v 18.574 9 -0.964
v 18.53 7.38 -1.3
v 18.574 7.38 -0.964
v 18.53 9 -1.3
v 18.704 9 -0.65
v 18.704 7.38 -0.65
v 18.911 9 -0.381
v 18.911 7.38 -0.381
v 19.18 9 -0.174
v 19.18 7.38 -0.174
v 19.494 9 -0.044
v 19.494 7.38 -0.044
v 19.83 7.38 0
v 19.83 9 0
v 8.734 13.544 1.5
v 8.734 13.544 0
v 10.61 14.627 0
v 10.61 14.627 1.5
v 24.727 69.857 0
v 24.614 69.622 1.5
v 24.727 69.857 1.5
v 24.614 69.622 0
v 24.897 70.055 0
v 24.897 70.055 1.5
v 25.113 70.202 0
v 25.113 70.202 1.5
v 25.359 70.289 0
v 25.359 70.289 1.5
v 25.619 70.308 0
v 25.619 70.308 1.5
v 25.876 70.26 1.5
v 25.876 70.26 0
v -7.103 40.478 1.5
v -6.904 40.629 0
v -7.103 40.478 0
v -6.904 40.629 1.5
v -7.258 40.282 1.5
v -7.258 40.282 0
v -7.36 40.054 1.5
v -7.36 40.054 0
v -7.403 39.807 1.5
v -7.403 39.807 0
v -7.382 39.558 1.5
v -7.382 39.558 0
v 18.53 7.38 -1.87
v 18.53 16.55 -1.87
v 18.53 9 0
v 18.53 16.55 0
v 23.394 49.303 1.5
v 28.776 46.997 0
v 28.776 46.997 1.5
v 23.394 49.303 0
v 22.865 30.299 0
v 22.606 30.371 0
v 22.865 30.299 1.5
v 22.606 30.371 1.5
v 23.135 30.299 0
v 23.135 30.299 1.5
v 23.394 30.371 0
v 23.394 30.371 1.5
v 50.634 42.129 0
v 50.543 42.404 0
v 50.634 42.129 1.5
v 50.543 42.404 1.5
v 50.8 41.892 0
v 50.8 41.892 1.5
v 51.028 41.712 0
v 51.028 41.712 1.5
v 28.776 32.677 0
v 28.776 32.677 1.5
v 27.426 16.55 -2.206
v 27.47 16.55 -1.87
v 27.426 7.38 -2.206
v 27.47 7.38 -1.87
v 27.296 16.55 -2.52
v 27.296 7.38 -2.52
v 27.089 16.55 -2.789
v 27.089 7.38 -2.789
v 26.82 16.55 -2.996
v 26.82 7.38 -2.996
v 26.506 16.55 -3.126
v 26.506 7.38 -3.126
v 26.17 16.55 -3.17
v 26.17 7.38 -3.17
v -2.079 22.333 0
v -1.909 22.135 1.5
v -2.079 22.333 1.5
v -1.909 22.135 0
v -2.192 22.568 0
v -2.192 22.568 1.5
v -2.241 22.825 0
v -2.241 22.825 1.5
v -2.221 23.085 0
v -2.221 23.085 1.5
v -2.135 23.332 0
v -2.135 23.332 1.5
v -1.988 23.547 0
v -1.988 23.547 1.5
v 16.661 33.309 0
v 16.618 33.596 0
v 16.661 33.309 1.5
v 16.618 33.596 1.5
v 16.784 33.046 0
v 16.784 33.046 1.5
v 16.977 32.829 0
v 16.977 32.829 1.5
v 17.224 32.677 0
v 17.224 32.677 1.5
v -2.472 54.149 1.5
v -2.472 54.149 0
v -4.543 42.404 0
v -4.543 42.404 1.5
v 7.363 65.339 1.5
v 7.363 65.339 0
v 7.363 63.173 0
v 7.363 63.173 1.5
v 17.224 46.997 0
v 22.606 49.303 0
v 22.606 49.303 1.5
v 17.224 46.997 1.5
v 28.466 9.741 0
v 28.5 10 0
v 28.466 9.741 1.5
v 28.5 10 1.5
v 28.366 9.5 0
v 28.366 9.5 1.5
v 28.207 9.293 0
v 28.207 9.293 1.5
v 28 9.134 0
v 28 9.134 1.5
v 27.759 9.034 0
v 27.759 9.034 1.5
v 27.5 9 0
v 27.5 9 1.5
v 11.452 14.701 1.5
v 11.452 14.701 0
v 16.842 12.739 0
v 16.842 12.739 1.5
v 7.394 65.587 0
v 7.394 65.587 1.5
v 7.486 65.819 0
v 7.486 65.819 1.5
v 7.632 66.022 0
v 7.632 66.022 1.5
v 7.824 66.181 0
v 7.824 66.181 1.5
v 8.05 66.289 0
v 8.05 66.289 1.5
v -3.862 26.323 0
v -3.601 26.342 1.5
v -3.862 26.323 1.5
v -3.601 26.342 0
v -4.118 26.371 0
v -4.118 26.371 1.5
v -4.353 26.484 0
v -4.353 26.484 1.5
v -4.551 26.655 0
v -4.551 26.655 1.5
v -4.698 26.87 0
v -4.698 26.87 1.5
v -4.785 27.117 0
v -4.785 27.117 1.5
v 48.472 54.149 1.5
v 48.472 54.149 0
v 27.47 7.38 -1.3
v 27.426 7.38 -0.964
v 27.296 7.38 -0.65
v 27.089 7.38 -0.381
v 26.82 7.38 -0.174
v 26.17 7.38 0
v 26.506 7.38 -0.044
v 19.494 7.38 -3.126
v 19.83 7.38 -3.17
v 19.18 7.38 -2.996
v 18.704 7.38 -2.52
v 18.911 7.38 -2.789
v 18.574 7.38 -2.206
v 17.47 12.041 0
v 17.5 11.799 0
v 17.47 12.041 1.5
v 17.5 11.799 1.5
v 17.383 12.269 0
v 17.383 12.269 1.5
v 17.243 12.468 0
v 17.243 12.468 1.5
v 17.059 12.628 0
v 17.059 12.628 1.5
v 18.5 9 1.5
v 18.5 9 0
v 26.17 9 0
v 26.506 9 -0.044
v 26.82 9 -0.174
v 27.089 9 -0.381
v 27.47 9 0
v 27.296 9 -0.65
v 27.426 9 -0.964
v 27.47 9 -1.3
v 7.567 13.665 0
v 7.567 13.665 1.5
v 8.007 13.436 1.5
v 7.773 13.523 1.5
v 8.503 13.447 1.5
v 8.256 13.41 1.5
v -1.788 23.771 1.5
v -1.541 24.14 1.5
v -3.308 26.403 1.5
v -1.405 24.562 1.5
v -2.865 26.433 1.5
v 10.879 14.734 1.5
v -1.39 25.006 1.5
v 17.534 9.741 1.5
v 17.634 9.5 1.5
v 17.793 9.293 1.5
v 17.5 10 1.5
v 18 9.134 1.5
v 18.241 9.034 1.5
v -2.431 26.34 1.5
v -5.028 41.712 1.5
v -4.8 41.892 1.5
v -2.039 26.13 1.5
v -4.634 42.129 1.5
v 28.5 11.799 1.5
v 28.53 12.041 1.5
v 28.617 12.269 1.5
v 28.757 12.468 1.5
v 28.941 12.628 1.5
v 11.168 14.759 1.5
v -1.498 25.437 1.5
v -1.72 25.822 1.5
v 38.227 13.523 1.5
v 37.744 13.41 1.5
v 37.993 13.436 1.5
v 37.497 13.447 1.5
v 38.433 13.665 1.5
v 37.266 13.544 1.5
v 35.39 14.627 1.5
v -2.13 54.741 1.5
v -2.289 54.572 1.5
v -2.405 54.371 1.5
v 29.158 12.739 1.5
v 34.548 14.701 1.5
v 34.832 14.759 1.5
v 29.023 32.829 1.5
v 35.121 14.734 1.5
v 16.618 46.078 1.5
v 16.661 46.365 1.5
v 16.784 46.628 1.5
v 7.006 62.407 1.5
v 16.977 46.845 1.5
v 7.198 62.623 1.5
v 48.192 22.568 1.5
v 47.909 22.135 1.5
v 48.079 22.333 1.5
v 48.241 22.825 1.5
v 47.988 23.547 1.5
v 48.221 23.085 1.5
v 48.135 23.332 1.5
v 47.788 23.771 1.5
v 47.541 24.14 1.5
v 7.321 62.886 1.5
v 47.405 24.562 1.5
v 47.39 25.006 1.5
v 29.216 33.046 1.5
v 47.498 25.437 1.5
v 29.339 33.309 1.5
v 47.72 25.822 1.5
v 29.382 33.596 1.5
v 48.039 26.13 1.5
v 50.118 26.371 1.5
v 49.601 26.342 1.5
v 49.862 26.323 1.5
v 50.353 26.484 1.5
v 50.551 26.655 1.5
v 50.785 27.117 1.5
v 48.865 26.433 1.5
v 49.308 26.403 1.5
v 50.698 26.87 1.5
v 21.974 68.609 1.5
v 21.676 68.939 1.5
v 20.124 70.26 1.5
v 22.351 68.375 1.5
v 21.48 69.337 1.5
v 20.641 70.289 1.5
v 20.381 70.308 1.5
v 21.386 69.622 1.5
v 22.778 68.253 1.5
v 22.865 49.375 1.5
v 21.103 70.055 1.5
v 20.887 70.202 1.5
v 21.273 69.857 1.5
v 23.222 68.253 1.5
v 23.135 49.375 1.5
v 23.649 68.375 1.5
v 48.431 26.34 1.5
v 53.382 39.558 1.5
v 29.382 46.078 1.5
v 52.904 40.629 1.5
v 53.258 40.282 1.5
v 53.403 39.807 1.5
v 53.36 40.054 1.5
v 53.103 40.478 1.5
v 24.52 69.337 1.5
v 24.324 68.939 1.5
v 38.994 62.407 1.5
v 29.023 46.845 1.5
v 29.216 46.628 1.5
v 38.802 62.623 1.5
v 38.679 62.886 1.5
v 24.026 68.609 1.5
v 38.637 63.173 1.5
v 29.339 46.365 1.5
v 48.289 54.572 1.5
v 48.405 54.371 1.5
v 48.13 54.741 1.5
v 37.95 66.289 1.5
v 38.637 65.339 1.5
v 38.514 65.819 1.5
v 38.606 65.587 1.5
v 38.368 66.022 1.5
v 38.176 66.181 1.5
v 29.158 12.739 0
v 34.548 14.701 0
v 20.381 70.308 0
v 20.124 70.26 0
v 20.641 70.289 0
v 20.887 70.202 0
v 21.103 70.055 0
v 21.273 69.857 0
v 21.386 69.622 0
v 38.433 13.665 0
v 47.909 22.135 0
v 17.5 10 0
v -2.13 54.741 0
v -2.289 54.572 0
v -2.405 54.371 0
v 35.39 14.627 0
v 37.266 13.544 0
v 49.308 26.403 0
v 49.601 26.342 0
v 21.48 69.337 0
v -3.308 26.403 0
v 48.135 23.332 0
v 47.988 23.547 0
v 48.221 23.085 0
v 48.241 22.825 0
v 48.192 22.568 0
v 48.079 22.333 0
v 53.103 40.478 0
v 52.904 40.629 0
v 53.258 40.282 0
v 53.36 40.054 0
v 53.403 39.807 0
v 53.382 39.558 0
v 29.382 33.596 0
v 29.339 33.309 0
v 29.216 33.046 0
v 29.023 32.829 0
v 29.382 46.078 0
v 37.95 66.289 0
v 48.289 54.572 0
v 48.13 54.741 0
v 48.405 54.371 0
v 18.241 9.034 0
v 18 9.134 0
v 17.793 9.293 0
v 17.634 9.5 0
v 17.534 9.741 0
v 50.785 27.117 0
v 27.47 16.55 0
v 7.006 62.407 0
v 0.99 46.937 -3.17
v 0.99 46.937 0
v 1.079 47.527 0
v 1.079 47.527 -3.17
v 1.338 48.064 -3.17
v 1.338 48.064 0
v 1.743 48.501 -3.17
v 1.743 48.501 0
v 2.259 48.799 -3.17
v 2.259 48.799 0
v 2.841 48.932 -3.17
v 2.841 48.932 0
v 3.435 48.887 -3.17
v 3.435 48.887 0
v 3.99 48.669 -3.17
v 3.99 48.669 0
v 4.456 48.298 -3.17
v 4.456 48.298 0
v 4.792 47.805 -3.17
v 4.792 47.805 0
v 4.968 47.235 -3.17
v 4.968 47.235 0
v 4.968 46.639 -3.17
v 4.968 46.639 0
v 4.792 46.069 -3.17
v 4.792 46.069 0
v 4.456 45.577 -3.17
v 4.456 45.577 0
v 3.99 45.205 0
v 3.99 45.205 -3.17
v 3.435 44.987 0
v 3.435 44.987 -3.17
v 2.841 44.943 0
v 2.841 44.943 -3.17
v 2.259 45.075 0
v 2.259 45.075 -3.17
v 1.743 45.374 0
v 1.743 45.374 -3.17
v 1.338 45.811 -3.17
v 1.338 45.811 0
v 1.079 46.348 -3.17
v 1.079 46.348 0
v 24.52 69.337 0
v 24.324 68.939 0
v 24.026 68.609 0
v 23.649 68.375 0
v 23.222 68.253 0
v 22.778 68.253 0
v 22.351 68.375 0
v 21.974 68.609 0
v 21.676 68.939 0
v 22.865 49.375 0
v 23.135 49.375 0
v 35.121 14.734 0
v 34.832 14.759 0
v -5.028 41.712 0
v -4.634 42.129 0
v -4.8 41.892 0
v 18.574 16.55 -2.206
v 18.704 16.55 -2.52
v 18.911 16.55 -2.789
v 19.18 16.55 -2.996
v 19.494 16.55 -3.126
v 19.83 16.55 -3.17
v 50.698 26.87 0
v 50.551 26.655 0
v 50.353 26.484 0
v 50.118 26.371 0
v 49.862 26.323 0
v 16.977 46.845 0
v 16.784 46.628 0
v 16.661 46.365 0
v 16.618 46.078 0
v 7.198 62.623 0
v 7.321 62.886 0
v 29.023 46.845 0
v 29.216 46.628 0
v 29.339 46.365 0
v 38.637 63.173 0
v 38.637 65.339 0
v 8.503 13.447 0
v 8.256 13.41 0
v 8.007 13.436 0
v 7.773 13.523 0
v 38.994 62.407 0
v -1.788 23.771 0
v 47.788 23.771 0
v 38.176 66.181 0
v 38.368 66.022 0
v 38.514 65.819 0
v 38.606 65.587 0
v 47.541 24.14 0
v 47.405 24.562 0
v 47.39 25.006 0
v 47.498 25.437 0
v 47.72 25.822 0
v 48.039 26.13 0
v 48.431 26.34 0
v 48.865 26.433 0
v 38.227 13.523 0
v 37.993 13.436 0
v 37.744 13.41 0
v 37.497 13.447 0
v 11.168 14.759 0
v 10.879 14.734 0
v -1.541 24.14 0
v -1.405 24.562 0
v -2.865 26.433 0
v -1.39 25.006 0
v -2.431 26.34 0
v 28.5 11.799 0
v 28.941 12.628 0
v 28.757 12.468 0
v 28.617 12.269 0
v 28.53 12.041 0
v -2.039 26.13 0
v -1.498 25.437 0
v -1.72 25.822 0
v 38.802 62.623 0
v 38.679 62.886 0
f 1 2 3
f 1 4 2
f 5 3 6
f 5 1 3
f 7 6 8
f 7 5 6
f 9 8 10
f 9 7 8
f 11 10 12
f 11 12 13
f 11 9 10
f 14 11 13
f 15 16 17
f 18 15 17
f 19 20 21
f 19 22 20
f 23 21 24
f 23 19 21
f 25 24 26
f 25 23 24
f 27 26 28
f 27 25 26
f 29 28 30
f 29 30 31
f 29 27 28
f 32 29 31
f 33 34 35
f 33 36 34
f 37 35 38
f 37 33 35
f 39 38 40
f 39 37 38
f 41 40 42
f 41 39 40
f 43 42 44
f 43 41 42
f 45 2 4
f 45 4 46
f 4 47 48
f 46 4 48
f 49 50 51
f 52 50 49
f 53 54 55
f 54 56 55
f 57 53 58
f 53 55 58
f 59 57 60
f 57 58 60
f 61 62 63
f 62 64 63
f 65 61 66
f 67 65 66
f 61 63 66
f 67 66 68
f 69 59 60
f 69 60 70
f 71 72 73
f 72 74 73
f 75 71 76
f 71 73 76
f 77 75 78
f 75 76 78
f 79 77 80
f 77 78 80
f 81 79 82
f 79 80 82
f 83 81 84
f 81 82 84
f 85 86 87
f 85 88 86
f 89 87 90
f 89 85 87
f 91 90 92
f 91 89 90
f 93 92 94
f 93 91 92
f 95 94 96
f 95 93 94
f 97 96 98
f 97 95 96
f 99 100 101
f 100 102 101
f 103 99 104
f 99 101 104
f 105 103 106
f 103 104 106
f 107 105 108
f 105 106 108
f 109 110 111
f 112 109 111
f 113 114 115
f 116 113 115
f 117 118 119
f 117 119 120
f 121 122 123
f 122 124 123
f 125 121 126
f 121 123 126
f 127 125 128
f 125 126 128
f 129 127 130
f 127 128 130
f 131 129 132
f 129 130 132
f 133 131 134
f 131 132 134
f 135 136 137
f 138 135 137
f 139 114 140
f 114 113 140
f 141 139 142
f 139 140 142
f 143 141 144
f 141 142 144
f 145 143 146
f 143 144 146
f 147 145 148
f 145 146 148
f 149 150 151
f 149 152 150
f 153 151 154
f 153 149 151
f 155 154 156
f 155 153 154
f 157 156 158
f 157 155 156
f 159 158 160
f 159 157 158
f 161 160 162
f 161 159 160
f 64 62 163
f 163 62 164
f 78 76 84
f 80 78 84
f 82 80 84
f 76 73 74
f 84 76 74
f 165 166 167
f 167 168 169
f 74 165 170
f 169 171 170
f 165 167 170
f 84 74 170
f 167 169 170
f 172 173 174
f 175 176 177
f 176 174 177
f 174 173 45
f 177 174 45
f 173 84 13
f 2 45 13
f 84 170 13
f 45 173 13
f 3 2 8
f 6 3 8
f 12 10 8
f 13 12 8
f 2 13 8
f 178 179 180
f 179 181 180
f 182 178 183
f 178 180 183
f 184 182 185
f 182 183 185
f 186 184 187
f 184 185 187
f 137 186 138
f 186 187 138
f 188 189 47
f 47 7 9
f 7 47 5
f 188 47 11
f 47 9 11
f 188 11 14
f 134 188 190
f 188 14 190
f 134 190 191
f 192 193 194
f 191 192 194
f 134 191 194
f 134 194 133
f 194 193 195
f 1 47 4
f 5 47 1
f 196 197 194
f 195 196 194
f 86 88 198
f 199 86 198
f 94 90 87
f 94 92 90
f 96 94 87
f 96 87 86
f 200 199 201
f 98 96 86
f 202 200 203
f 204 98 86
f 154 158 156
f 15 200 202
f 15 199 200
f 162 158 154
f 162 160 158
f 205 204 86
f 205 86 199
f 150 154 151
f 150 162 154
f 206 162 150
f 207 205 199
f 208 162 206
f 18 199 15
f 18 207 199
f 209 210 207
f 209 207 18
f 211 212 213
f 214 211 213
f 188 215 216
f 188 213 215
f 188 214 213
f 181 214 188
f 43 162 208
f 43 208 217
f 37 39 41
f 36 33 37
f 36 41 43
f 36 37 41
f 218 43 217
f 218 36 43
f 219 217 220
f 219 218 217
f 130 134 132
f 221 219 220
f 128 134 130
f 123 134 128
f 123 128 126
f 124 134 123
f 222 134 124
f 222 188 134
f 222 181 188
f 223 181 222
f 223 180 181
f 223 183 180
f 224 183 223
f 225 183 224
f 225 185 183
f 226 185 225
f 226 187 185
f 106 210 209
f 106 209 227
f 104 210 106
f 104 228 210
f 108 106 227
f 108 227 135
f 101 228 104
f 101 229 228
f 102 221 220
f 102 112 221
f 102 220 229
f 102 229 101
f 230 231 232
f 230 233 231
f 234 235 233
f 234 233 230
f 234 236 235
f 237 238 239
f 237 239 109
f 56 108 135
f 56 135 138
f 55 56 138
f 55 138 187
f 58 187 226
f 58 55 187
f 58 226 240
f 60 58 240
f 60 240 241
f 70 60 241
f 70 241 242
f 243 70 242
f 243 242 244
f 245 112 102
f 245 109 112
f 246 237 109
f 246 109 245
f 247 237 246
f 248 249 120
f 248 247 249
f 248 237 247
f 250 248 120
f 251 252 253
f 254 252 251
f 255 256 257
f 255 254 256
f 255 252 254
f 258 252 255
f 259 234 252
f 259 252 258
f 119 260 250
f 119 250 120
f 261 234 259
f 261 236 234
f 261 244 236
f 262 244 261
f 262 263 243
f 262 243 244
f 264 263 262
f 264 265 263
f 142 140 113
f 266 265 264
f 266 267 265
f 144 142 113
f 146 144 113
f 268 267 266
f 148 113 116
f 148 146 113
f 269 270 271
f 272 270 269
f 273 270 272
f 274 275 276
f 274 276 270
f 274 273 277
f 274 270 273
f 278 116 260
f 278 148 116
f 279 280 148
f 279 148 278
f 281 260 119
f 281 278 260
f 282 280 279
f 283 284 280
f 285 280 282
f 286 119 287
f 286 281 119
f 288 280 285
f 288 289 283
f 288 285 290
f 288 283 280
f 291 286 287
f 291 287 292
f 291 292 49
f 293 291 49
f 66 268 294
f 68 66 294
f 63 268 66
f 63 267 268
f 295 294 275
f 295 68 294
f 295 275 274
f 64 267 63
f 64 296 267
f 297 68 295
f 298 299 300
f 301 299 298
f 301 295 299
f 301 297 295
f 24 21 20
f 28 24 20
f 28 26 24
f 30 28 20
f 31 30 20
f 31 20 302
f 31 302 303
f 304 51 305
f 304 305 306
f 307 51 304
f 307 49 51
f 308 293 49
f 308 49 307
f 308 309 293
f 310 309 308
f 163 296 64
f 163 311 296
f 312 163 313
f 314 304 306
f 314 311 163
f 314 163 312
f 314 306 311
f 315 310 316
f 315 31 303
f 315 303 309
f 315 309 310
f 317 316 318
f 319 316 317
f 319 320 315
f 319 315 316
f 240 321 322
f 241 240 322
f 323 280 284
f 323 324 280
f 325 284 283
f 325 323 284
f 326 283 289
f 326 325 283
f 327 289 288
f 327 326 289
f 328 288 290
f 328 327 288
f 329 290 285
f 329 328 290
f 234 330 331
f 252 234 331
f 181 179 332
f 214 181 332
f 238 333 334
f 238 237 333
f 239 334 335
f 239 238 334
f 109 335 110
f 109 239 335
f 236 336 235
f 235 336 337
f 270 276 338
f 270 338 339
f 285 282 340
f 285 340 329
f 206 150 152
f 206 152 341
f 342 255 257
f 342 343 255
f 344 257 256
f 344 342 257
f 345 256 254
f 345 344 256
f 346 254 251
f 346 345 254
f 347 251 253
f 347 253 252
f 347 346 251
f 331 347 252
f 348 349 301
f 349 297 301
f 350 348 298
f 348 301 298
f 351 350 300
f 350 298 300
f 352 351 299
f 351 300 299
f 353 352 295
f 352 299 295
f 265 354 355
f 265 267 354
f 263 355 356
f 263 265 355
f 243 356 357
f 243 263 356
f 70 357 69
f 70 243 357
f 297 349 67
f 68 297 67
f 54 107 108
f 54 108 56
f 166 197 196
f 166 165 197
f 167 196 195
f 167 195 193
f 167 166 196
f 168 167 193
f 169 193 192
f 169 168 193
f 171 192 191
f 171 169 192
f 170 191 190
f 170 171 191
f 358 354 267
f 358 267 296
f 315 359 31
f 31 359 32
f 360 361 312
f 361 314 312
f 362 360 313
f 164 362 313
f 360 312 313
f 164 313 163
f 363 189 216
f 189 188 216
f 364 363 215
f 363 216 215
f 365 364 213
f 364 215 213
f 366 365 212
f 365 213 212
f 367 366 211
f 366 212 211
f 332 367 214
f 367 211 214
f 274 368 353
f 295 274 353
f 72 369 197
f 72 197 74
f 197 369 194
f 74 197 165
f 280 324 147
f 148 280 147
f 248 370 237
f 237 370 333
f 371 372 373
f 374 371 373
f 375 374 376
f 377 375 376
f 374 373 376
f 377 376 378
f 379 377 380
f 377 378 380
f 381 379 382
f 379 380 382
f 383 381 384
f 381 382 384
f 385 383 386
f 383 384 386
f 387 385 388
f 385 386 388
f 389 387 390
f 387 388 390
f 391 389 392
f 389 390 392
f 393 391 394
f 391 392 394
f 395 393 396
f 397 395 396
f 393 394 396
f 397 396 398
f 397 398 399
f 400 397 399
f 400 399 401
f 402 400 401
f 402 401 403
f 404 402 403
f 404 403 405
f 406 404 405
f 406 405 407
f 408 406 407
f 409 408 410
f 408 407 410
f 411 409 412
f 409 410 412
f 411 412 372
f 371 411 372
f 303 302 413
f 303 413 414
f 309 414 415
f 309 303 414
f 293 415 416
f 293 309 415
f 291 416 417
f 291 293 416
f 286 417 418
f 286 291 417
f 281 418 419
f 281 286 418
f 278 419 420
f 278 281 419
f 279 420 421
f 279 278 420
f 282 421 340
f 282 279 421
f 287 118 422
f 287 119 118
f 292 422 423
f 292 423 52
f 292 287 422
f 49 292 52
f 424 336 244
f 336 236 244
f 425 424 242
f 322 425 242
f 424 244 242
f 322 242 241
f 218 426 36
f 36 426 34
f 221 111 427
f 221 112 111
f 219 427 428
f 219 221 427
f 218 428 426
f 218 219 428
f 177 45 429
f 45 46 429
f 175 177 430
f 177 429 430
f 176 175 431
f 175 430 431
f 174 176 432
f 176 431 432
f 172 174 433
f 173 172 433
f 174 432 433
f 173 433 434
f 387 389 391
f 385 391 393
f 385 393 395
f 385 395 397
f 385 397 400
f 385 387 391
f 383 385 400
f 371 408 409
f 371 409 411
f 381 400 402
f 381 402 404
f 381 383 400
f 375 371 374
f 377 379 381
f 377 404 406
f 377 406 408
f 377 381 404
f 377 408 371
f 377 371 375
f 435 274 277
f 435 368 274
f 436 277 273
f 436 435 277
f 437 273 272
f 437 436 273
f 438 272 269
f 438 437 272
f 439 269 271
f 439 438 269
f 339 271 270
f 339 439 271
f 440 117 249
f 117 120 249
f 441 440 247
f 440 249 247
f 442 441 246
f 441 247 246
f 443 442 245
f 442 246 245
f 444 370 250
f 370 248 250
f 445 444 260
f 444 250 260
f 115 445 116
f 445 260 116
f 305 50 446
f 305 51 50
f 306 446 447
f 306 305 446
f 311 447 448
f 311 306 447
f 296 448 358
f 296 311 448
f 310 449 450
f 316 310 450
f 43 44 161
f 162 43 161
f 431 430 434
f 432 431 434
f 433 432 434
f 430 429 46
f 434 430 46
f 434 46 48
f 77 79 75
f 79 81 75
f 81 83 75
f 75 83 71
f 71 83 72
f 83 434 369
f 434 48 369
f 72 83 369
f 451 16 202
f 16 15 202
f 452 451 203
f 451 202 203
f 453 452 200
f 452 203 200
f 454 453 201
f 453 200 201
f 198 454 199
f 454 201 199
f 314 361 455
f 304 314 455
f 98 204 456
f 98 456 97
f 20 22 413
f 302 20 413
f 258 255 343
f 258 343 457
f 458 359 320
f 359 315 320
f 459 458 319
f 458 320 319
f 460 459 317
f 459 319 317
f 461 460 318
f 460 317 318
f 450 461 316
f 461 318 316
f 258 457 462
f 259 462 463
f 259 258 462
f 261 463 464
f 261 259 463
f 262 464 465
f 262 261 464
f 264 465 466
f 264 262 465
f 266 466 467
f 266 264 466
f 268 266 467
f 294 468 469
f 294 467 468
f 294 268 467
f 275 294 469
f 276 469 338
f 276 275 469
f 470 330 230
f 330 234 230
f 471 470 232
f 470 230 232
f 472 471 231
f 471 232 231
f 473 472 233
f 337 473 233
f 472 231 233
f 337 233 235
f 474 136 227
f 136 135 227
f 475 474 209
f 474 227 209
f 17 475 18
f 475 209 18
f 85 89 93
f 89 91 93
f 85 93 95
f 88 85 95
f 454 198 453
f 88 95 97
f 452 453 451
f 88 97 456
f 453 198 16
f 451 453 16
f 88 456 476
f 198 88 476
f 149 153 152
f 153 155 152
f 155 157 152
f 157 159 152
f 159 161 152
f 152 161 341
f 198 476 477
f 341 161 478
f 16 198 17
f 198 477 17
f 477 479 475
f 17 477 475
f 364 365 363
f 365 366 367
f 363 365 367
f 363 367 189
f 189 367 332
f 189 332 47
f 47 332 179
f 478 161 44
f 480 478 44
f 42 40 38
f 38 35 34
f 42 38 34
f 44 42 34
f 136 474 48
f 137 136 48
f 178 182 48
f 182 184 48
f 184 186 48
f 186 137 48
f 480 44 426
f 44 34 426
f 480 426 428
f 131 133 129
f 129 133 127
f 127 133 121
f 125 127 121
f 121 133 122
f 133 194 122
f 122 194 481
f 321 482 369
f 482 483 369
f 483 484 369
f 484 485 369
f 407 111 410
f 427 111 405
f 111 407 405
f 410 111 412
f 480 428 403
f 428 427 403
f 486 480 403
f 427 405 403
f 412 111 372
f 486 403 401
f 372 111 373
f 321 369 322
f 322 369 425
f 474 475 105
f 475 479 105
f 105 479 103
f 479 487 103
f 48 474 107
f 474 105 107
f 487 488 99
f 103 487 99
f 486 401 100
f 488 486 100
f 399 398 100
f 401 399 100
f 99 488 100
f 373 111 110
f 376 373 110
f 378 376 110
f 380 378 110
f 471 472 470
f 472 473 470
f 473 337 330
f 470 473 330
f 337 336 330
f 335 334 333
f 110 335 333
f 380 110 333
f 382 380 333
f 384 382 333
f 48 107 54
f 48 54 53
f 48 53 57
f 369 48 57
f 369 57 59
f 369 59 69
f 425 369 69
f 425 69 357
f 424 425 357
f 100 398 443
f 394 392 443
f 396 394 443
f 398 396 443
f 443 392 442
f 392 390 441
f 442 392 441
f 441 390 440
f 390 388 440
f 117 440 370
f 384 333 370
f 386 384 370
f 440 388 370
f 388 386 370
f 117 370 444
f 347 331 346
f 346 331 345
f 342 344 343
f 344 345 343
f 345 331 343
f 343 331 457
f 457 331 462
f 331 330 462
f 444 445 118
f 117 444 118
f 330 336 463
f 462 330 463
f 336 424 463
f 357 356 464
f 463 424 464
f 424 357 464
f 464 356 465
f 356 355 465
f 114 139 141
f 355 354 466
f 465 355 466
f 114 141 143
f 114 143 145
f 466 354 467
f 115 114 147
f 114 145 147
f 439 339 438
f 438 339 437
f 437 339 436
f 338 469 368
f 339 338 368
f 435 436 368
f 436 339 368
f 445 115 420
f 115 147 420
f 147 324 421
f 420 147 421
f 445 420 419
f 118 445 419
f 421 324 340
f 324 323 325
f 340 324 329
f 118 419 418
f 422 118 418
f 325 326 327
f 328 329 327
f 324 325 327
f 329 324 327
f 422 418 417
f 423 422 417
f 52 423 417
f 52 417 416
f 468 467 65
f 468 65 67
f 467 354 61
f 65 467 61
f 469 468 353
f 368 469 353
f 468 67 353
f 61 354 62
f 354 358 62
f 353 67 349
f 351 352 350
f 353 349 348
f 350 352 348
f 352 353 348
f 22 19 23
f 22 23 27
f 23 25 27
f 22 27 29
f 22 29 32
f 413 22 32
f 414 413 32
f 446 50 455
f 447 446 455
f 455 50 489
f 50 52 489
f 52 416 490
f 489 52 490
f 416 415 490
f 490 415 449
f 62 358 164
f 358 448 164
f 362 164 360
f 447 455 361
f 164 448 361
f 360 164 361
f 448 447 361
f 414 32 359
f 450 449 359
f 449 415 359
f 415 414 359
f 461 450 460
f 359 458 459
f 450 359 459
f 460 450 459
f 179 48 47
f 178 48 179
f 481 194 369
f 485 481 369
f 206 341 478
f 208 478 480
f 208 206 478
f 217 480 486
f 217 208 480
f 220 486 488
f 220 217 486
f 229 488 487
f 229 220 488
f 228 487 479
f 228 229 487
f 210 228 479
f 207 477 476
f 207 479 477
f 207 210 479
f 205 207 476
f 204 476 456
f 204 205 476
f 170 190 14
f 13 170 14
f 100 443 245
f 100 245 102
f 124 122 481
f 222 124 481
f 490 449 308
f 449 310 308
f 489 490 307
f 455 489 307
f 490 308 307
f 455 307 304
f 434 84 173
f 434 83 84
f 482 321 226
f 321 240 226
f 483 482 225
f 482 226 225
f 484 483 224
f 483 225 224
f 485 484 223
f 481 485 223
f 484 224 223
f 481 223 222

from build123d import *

# Parameters (mm, degrees)
BOSS_EXTRUDE1_DEPTH = 1.5
CUT_EXTRUDE1_DEPTH  = 2.5
CIRPATTERN1_COUNT   = 3
FILLET1_R           = 1
BOSS_EXTRUDE2_DEPTH = 3.17
FILLET2_R           = 1.3
SKETCH5_R           = 2
BOSS_EXTRUDE3_DEPTH = 3.17


with BuildPart() as part:
    # Sketch1 → Boss-Extrude1 (new body)
    with BuildSketch(Plane.XY):
        Polygon((7.362742618, 62.70624455), (-2.408800458, 54.506946358), (-4.623829447, 41.944892725), (-7.530430409, 40.266765877), (-4.165710563, 24.153038268), (8.106826973, 13.1822416), (11.013427935, 14.860368448), (17.5, 12.499449294), (17.5, 9), (28.5, 9), (28.5, 12.499449294), (34.986572065, 14.860368448), (37.893173027, 13.1822416), (50.165710563, 24.153038268), (53.530430409, 40.266765877), (50.623829447, 41.944892725), (48.408800458, 54.506946358), (38.637257382, 62.70624455), (38.637257382, 66.062498246), (23, 71.205429186), (7.362742618, 66.062498246), align=None)
        Polygon((23, 49.472293945), (16.618365096, 46.737307558), (16.618365096, 32.93702959), (23, 30.202043203), (29.381634904, 32.93702959), (29.381634904, 46.737307558), align=None, mode=Mode.SUBTRACT)
    extrude(amount=BOSS_EXTRUDE1_DEPTH)

    # Sketch2 → Cut-Extrude1 (cut, through all)
    with BuildSketch(Plane.XY.offset(1.5)):
        with BuildLine():
            Line((-4.580131881, 26.137712338), (-3.307805549, 26.403387777))
            ThreePointArc((-3.307805549, 26.403387777), (-1.595121467, 25.637168574), (-1.787898214, 23.770831049))
            Line((-1.787898214, 23.770831049), (-2.654143059, 22.801801844))
            Line((-2.654143059, 22.801801844), (-4.165710563, 24.153038268))
            Line((-4.165710563, 24.153038268), (-4.580131881, 26.137712338))
        make_face()
    cut_extrude1 = extrude(amount=-CUT_EXTRUDE1_DEPTH, mode=Mode.SUBTRACT)

    # CirPattern1: Cut-Extrude1 ×3 about axis
    cirpattern1_axis = Axis((23, 39.837168574, 0), (0, 0, 1))
    for i in range(1, CIRPATTERN1_COUNT):
        add(cut_extrude1.rotate(cirpattern1_axis, i * 360 / CIRPATTERN1_COUNT), mode=Mode.SUBTRACT)

    # Fillet1
    fillet1_edges = [part.edges().sort_by_distance(p)[0] for p in [
        (48.654143059, 22.801801844, 0.75),
        (50.580131881, 26.137712338, 0.75),
        (24.925988822, 70.571991541, 0.75),
        (21.074011178, 70.571991541, 0.75),
        (7.362742618, 66.062498246, 0.75),
        (38.637257382, 66.062498246, 0.75),
        (38.637257382, 62.70624455, 0.75),
        (48.408800458, 54.506946358, 0.75),
        (50.623829447, 41.944892725, 0.75),
        (53.530430409, 40.266765877, 0.75),
        (37.893173027, 13.1822416, 0.75),
        (34.986572065, 14.860368448, 0.75),
        (28.5, 12.499449294, 0.75),
        (28.5, 9, 0.75),
        (17.5, 9, 0.75),
        (17.5, 12.499449294, 0.75),
        (11.013427935, 14.860368448, 0.75),
        (8.106826973, 13.1822416, 0.75),
        (-7.530430409, 40.266765877, 0.75),
        (-4.623829447, 41.944892725, 0.75),
        (-2.408800458, 54.506946358, 0.75),
        (7.362742618, 62.70624455, 0.75),
        (16.618365096, 32.93702959, 0.75),
        (23, 30.202043203, 0.75),
        (29.381634904, 32.93702959, 0.75),
        (29.381634904, 46.737307558, 0.75),
        (23, 49.472293945, 0.75),
        (16.618365096, 46.737307558, 0.75),
        (-4.580131881, 26.137712338, 0.75),
        (-2.654143059, 22.801801844, 0.75),
    ]]
    fillet(fillet1_edges, radius=FILLET1_R)

    # Sketch4 → Boss-Extrude2 (add)
    with BuildSketch(Plane(origin=(0, 0, 0), x_dir=(-1, 0, 0), z_dir=(0, 0, -1))):
        Polygon((-27.47, 9), (-27.47, 7.38), (-18.53, 7.38), (-18.53, 9), (-18.53, 16.55), (-27.47, 16.55), align=None)
    extrude(amount=BOSS_EXTRUDE2_DEPTH)

    # Fillet2
    fillet2_edges = [part.edges().sort_by_distance(p)[0] for p in [
        (27.47, 8.19, 0),
        (18.53, 8.19, 0),
        (27.47, 11.965, -3.17),
        (18.53, 11.965, -3.17),
    ]]
    fillet(fillet2_edges, radius=FILLET2_R)

    # Sketch5 → Boss-Extrude3 (add)
    with BuildSketch(Plane(origin=(0, 0, 0), x_dir=(-1, 0, 0), z_dir=(0, 0, -1))):
        with Locations((-2.99, 46.937168574)):
            Circle(SKETCH5_R)
    extrude(amount=BOSS_EXTRUDE3_DEPTH)


solid = part.part
